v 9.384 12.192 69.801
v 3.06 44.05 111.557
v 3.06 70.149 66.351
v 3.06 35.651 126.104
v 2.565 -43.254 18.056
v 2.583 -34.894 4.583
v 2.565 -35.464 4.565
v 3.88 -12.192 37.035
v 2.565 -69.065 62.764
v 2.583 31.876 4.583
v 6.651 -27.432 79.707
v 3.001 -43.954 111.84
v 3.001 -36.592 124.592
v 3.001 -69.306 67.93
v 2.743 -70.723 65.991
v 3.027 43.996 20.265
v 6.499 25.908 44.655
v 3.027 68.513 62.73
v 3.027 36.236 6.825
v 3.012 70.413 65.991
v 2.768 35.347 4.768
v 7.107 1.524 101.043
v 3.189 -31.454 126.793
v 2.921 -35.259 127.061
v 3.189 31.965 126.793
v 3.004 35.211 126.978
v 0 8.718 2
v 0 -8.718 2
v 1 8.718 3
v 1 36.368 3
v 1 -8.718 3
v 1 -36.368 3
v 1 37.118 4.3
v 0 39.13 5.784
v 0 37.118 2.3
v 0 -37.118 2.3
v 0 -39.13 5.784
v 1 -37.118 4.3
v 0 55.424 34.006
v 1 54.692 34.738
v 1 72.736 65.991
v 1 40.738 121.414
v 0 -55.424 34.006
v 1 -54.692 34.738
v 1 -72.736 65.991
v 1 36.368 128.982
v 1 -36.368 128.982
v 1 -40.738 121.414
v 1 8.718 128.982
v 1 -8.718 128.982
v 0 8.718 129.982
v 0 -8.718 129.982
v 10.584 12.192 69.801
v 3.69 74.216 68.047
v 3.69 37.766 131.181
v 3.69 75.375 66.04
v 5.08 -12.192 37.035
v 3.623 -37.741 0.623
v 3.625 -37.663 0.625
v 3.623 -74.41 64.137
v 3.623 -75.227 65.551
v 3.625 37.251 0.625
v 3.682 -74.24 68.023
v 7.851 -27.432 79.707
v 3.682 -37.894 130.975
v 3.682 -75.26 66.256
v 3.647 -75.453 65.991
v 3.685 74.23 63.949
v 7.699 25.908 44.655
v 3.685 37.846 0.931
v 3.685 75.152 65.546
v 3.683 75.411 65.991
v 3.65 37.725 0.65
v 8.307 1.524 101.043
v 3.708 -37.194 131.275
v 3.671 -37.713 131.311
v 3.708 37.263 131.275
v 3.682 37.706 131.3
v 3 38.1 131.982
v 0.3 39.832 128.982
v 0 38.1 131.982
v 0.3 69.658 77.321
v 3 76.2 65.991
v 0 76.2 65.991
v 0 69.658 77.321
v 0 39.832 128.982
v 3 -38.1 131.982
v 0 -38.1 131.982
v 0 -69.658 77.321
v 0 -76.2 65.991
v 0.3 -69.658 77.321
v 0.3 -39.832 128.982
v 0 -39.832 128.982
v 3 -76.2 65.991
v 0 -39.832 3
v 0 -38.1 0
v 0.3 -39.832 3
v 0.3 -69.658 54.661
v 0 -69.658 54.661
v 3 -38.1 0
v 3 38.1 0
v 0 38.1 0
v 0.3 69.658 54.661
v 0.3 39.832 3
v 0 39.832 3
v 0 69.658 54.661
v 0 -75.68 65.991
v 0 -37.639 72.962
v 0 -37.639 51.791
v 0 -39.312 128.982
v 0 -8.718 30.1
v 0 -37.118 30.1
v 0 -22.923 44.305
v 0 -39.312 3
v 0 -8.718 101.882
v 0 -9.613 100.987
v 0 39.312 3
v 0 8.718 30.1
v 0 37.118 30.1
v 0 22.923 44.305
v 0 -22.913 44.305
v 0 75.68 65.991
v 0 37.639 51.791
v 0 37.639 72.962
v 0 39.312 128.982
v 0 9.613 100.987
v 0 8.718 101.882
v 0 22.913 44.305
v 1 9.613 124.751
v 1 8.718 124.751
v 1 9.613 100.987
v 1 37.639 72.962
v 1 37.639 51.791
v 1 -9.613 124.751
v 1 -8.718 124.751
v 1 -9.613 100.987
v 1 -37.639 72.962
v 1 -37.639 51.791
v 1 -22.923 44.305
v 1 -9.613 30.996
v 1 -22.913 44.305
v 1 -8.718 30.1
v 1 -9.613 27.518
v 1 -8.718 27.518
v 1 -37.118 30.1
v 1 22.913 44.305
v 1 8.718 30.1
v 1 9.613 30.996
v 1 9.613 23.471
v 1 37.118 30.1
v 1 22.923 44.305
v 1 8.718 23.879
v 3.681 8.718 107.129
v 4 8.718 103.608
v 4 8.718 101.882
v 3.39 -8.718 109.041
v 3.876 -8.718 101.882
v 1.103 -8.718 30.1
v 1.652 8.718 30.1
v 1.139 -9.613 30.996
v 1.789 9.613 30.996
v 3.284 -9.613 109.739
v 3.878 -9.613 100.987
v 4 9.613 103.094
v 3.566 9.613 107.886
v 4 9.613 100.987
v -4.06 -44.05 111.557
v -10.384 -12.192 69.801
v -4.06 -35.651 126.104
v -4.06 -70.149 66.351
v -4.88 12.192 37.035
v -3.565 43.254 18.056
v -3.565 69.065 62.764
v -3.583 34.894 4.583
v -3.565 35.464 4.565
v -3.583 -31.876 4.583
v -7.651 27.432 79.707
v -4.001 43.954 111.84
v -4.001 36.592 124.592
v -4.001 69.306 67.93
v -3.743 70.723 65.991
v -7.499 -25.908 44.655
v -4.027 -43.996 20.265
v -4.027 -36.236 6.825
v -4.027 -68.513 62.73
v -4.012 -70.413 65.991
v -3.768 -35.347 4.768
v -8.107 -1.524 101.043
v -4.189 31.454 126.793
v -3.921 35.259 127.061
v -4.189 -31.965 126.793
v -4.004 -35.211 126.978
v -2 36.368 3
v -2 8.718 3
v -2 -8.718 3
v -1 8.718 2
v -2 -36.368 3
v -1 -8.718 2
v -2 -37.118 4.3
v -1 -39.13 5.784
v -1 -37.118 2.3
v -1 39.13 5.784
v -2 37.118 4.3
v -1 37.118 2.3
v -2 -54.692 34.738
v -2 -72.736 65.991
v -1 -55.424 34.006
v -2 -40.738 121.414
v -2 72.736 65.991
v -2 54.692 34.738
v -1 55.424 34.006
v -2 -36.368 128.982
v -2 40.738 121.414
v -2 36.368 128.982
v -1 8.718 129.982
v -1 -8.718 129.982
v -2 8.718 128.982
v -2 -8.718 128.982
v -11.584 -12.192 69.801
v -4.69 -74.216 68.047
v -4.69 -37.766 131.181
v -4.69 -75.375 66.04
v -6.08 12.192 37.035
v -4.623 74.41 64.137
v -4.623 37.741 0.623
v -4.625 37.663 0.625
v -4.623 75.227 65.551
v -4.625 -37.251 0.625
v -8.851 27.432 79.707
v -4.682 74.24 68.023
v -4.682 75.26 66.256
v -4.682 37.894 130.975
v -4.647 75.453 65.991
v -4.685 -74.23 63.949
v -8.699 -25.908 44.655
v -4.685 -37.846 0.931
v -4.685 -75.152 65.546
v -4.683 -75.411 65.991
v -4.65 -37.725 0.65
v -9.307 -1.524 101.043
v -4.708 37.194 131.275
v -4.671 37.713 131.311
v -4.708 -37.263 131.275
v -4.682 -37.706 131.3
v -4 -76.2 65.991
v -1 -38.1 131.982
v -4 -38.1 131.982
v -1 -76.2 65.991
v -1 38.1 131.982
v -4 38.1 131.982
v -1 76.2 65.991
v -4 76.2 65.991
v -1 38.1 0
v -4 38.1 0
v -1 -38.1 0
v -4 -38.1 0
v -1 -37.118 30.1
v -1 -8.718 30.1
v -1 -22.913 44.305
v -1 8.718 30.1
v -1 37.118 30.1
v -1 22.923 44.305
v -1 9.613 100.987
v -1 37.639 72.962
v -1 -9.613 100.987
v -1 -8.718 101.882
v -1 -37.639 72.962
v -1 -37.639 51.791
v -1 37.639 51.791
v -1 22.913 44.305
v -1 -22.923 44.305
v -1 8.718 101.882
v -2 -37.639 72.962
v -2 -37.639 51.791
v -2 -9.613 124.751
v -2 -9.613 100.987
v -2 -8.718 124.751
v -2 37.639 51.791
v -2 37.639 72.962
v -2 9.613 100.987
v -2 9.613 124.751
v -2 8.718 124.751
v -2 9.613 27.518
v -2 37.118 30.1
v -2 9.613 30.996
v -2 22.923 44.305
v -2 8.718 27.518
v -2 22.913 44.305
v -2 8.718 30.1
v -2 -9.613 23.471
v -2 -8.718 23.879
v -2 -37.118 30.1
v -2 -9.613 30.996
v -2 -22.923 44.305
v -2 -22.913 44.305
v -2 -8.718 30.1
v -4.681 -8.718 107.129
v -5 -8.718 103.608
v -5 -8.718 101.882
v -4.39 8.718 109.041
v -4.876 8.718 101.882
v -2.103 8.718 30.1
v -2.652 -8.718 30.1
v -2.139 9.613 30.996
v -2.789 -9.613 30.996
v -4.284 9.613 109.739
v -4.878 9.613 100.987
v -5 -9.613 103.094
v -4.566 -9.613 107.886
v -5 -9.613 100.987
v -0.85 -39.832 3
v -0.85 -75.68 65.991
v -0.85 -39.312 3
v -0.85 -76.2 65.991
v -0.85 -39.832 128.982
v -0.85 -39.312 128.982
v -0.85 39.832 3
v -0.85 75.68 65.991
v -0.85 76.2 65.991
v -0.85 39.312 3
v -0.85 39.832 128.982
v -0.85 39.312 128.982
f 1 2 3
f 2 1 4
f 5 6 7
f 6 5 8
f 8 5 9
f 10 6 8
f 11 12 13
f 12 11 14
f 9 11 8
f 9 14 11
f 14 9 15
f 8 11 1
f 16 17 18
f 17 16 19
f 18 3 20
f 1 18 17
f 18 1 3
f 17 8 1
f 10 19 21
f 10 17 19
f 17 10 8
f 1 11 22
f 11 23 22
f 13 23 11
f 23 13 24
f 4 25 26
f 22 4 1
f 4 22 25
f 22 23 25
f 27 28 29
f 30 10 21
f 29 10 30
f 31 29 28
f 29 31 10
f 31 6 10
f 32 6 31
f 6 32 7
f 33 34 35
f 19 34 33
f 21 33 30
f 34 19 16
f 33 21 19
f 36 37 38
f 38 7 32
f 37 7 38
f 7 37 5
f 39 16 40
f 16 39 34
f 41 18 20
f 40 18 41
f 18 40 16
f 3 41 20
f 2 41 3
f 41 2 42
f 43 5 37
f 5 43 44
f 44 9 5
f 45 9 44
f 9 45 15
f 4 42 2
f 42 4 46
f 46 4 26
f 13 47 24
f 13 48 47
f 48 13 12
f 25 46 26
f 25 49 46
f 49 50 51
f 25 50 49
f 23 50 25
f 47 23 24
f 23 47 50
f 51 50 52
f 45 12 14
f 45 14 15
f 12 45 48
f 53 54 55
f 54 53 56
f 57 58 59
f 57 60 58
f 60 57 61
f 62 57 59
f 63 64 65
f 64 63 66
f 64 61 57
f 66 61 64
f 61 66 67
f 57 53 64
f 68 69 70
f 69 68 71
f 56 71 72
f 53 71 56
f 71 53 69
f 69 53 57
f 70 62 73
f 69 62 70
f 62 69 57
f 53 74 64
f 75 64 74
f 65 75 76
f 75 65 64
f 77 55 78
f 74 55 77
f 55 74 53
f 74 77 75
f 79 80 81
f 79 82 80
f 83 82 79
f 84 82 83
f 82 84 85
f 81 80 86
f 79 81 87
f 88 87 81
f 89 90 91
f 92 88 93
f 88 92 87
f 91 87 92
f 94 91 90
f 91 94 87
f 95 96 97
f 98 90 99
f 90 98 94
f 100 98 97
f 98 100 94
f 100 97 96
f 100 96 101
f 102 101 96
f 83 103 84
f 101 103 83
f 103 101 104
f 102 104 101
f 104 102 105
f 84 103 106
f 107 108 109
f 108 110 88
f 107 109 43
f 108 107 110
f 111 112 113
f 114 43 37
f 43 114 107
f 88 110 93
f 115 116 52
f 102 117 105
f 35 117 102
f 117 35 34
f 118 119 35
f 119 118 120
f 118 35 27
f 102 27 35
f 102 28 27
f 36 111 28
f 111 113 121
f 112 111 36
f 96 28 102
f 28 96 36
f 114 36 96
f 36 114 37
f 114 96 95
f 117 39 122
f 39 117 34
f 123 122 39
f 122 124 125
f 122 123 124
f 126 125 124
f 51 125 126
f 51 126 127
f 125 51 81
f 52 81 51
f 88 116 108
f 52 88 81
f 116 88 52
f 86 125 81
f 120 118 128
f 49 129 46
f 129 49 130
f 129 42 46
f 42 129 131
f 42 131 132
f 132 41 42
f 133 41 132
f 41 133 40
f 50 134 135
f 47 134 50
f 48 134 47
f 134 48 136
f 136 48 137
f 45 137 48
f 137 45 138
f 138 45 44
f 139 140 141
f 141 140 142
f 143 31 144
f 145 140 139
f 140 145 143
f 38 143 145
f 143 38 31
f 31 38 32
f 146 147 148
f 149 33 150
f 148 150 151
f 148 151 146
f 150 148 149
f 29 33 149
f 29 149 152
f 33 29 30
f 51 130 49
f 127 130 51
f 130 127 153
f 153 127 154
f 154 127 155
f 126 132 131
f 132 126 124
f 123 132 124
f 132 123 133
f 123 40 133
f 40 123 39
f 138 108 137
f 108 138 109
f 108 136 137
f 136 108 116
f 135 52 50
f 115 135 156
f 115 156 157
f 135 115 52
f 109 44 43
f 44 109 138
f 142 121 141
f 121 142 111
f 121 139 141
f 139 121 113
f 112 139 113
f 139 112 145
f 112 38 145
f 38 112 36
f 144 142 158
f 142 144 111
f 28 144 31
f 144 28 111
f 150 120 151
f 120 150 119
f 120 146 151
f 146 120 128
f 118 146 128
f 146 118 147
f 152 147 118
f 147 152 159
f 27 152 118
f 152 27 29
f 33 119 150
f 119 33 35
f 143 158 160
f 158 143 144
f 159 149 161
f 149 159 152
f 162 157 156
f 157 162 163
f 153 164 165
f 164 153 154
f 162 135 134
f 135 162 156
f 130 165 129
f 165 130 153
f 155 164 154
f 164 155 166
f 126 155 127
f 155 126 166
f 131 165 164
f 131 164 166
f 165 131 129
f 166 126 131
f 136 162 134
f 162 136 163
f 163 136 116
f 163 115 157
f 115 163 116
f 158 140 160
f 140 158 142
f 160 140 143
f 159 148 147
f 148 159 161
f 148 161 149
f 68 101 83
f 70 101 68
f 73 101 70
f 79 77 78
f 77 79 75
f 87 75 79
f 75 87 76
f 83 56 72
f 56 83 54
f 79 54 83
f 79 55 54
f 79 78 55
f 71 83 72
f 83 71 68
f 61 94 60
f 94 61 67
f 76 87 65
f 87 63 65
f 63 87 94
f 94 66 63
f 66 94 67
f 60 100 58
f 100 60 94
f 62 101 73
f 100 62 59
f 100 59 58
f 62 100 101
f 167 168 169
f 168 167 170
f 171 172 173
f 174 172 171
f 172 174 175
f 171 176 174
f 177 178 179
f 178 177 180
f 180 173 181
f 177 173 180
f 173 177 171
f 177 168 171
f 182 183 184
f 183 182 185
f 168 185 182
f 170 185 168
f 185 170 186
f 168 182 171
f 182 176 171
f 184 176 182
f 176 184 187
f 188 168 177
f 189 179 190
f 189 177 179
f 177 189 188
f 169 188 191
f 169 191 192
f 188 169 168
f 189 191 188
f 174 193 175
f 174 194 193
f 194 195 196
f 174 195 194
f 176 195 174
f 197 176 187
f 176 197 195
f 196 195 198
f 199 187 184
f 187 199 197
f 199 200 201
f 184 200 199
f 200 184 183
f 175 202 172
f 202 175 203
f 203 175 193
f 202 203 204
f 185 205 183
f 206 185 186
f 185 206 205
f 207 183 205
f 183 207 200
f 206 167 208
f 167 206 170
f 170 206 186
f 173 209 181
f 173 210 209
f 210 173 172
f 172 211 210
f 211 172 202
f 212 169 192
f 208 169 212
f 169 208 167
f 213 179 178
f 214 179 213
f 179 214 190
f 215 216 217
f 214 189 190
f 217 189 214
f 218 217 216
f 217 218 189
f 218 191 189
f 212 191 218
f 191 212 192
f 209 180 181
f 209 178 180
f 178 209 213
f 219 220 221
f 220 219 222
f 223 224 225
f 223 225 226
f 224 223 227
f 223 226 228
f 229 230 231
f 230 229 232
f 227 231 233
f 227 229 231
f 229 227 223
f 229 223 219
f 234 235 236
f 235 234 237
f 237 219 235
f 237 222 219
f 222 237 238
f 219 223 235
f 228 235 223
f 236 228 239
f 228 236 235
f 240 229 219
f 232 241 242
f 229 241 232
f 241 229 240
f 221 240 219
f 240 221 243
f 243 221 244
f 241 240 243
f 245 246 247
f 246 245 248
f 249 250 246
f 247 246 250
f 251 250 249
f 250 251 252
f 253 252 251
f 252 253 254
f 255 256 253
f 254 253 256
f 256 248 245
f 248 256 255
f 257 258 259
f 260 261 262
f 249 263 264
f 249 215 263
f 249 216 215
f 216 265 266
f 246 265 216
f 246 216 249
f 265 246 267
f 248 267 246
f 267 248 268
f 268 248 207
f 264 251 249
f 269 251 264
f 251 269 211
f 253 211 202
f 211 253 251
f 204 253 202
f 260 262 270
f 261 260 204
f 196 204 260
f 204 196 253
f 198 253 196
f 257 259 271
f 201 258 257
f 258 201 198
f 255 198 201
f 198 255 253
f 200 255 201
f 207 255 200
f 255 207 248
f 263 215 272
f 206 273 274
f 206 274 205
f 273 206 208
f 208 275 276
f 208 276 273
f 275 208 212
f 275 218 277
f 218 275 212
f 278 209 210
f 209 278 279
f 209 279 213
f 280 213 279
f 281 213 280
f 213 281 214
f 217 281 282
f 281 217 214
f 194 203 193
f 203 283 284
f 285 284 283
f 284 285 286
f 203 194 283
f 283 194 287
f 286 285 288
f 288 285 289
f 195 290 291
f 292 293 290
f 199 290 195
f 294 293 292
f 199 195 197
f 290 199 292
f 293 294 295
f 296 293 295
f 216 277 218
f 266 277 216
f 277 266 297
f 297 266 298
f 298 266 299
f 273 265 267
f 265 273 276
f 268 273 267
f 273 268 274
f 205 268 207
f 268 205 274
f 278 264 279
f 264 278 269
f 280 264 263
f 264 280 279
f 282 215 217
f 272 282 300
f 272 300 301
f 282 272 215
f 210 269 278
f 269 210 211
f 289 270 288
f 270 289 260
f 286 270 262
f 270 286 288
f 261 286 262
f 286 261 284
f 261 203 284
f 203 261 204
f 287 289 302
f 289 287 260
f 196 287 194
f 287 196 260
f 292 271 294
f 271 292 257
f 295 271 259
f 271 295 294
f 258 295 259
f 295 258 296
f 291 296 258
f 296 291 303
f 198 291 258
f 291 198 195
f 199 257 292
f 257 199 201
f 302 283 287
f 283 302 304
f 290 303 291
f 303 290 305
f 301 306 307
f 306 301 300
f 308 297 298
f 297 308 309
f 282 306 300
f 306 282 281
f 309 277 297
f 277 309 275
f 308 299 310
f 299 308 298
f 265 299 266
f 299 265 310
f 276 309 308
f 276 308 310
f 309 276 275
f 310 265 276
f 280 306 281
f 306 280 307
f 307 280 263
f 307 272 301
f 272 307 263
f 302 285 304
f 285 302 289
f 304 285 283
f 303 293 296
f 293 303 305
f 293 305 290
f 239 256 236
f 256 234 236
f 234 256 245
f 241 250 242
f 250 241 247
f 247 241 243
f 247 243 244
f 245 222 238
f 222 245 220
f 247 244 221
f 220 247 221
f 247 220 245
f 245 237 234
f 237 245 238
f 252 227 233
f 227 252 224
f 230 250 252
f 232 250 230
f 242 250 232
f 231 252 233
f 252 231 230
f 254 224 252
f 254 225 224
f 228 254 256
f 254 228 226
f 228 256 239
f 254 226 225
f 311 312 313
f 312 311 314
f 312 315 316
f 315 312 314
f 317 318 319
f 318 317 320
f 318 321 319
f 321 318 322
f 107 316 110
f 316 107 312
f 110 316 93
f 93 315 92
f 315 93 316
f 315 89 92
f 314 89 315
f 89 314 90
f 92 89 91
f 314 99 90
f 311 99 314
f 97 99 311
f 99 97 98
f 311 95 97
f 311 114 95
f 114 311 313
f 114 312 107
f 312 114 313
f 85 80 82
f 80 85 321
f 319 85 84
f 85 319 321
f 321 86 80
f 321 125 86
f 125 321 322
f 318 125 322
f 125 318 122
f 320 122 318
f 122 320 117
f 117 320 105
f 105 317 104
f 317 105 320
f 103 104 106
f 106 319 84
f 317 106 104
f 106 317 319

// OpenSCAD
// Hexagon wall tile v50 — parametric rebuild of v30
// Front: identical low-poly facets to v30 (same facet angles at every size).
// Edge profile: identical on every size (edge depth, rim width) so tiles butt flush.
// Back: six corner pads for 1" (25 mm) double-sided mounting tape.
// v32: tape pads are flat plates hung from the rim with an air gap to the front skin.
// v33: thinner skin + thinner pads so the air gap is 1.4 mm even right at the edges
//      (v32 had only 0.8 mm there and showed marks along the slanted edges).
// v34: snap-off stabilizer fins behind the bottom edge so the tall, thin tile can't tip over
//      while printing. Break them off afterwards (bend sideways) and the back stays flat.
// v35: 0.6 mm 45° chamfer on the front edge (crisp, consistent shadow line between tiles; hides
//      first-layer squish and brim trim marks) + relief_scale to deepen the facets if wanted.
// v37: much smaller breakaway tabs (0.8 x 0.6 mm, every 8 mm) so the fins snap off easily.
// v38: full-height snap-off BRACE FRAME behind the tile: a thin hex ring + X/vertical bars,
//      1 mm behind the back, tied to the tile rim by tiny tabs all the way round (incl. the top).
//      Tile + brace act as a stiff box while printing; the fins now sit on the brace.
//      Peel the brace off after printing — the tabs only touch the back rim.
// v39: PAIR mode (default): two identical tiles printed back-to-back, 0.4 mm apart, so each
//      cradles the other full-height. Only 12 tiny tabs (corners + mid-sides) join the back
//      rims — twist/peel the tiles apart. No brace, no fins, almost no waste. The pair is
//      turned 90° on the bed so the 'back' seam lands on a side edge, not on either face.
// v40: pair tabs spaced evenly every ~pair_tab_pitch mm round the rim on EVERY size. In v39 the
//      tab spacing grew with the tile (3": ~23 mm max gap, 6": ~46 mm, 10": ~79 mm), so the 3" pair
//      printed perfectly but the 6" rims flexed apart between tabs and broke up above mid-height.
//      Now every size has the same tab spacing as a stiff 3" pair (or tighter).
// v42: tabs replaced by one continuous hairline SEAM round the outer edge of the pair gap.
//      Discrete tabs changed the toolpath on every layer that had a tab, leaving a faint line
//      across the tile every ~10 mm of height. With a continuous seam every layer has the same
//      shape, so there is nothing to print differently. Separate the tiles by running a utility
//      knife along the seam line on the edges, then twist apart.
// v43: stiffer tape pads — each pad now grows from the back plane toward the front until it is
//      pad_gap (1.4 mm) from the skin, instead of being a 1 mm plate (the skin stays untouched, so
//      no ghost lines). Larger tiles (>= mid_pad_min_in)
//      get four extra pads at the slanted mid-edges: 10 tape spots on the 10".
// v44: UNIFORM pads. Every pad is the same PAD x PAD tape square, pushed snug into its corner
//      (touching both rims), with only a small 45° gusset beneath it down to the rim so it prints
//      without support. Because a hex corner is the same angle at every size, the 6" and 10" pads
//      are identical in shape and size; the 3" uses the same layout with smaller squares.
//      The 10" adds the same square at the middle of each slanted edge.
// v46: pads are a 1 mm plate with a stiffening LIP round the free edges (like a shallow tray),
//      instead of solid-filled — nearly the stiffness of v44's deep pads at close to v42 print time.
// v47: pair gap 0.4 -> 1.0 mm. At 0.4 mm the squashed back walls of the two tiles touched and
//      fused, so v42-v46 pairs would not come apart. At 1.0 mm only the hairline edge seam joins
//      them: cut it with a utility knife (there is now room for the blade) and they separate.
// v48: seam only on the four SLANTED edges. The top and bottom flat edges are left open (a 1 mm
//      slot), so a putty knife / flat screwdriver can go in and pry the pair open, unzipping the
//      seam. Every layer still crosses the seam at both ends, so the layer shape stays constant.
// v49: "KISS" seam — the seam is printed on ONE tile only and stops seam_kiss short of the other
//      tile's back. The two tiles are never one solid: they only touch where the plastic squashes
//      out, which tacks them lightly (enough to steady them while printing, weak enough to snap by
//      hand). Set seam_kiss = 0 to go back to the fused v48 seam.
// v50: (1) every tape pad gets a 45° pointed top, so pads taper out over many layers instead of
//      ending on one layer. Abrupt pad ends changed the layer time suddenly and left a line across
//      the face (seen at ~14% and ~36% height on the 10").
//      (2) the stiffening lips stay lip_gap (2.5 mm) clear of the skin, not 1.4: near the edges the
//      lips were hugging the skin and ghosting through as ridges parallel to the edge.
// Prints upright on a flat edge with NO supports (every downward edge is 45° or steeper).
//
// Export one size at a time, e.g.:
//   openscad -D size_in=6 -o hex_pair_v50_6in.stl hex_wall_tile_v50.scad

/* [Size] */
size_in       = 6;      // point-to-point width in inches (3, 6, 10 ...)

/* [Edge profile — keep identical across sizes] */
// Space behind the skin at the edge = edge_depth - skin; it must be >= pad_plate + pad_gap + pad_recess.
edge_depth    = 3.6;    // depth of the outer edge, back plane to front face (mm)
rim           = 2.0;    // perimeter wall thickness at the back plane (mm)
front_chamfer = 0.6;    // 45° chamfer on the front edge (mm); 0 = sharp edge

/* [Look] */
relief_scale  = 1.0;    // 1.0 = v30 facets; 1.5 = 50% deeper facets (same edge profile on all sizes)

/* [Front skin] */
skin          = 1.2;    // front skin thickness (mm) — 3 lines at 0.4 mm, same on all sizes

/* [Tape pads] */
tape_width    = 25.4;   // tape width (mm)
pad_margin    = 3;      // extra pad width beyond the tape (mm)
pad_max_frac  = 0.45;   // pad never larger than this fraction of the tile radius (keeps 3" usable)
pad_plate     = 1.0;    // minimum pad thickness (mm) — at the very edge, where there is least room
pad_depth     = 4;      // stiffening lip depth (mm); always stops pad_gap from the skin
lip_gap       = 2.5;    // lips stop this far from the skin (plates keep pad_gap)
pad_lip       = 0.9;    // lip thickness (mm) — two lines
mid_pad_min_in = 8;     // tiles this size or larger also get pads at the four slanted mid-edges
pad_gap       = 1.4;    // minimum air gap between pads and the front skin (mm) — keeps the front clean
pad_recess    = 0;      // pads set back from the rim (mm); >0 lets the rim touch the wall,
                        // but near the edges the plate is then trimmed thinner to keep pad_gap

/* [Print stabilizers (snap off after printing)] */
stabilizers   = false;  // v34-v38 option; not needed in pair mode
fin_count     = 2;      // fins behind the bottom edge, placed symmetrically
fin_thick     = 1.6;    // fin thickness (mm)
fin_height_frac = 0.35; // fin height as a fraction of the tile height
fin_depth_frac  = 0.4;  // fin depth behind the brace as a fraction of fin height
fin_depth_min   = 15;   // (mm)
fin_gap       = 0.5;    // air gap between fin and tile back (mm)
tab_height    = 0.6;    // breakaway tab height (mm, vertical when printing) — 3 layers at 0.2
tab_width     = 0.8;    // breakaway tab width (mm), centred on the fin — 2 lines
tab_pitch     = 8;      // spacing between tabs (mm)

/* [Full-height brace frame (snap off after printing)] */
brace         = false;  // v38 option; not needed in pair mode
brace_gap     = 1.0;    // air gap between tile back and brace (mm)
brace_thick   = 1.6;    // brace thickness (mm)
brace_rim_w   = 4;      // width of the brace's hex ring (mm)
brace_bar_w   = 3;      // width of the X and vertical bars (mm)
brace_tab_pitch = 10;   // spacing of brace tabs along each rim side (mm)
brace_tab     = 0.8;    // brace tab size (mm) — tiny, so the brace peels off

/* [Back-to-back pair (default)] */
pair          = true;
pair_gap      = 1.0;    // gap between the two back planes (mm) — v47: 1.0 so the backs cannot fuse; the edge seam alone joins them
pair_tab      = 0.6;    // tab size (mm) — tiny, so the pair twists apart
pair_tab_pitch = 12;    // (v40 tabs, unused when pair_seam_w > 0)
pair_seam_w   = 0.45;   // width of the continuous edge seam bridging the gap (mm) — about one line
seam_kiss     = 0.15;   // gap between the seam tip and the other tile (mm); 0 = fused seam
seam_open     = 3;      // leave the seam off this far from the top and bottom flat edges (mm) -> pry slots

/* [Output] */
orient_for_print = true; // stand upright on a flat edge, back facing +Y

/* [Hidden] */
R   = size_in * 25.4 / 2;         // corner radius
AP  = R * cos(30);                // apothem
PAD = min(tape_width + pad_margin, R * pad_max_frac);

// Normalised front geometry from v30 (x, y in units of R; z = relief above edge, units of R)
FP = [[1,0,0],[0.5,0.866025,0],[-0.5,0.866025,0],[-1,0,0],[-0.5,-0.866025,0],[0.5,-0.866025,0],
      [0.16,0.05,0.091654],[-0.16,-0.38,0.019428],[-0.36,0.18,0.05579],[0.34,-0.28,0.053795],[0.02,0.46,0.061766]];
FACES = [[0,6,1],[4,3,7],[5,4,7],[8,3,2],[7,3,8],[7,8,6],[5,9,0],[9,6,0],[9,7,6],[5,7,9],
         [6,8,10],[8,2,10],[6,10,1],[10,2,1],
         [1,12,11,0],[2,13,12,1],[3,14,13,2],[4,15,14,3],[5,16,15,4],[0,11,16,5],
         [11,12,13,14,15,16]];
RELIEF_MAX = 0.091654 * R * relief_scale;
D = edge_depth + RELIEF_MAX + 1;  // max depth used for chamfers

// Solid bounded by the faceted front (shifted by dz) and a flat back at z = zb
module body(dz = 0, zb = 0) {
    pts = concat(
        [for (p = FP) [p[0]*R, p[1]*R, edge_depth + p[2]*R*relief_scale + dz]],
        [for (i = [0:5]) [FP[i][0]*R, FP[i][1]*R, zb]]);
    polyhedron(points = pts, faces = FACES, convexity = 4);
}

module hex2d(apothem) { circle(r = apothem / cos(30), $fn = 6); }

// Back cavity: behind the skin, inside the rim; rim inner faces slope 45° so nothing needs support
module cavity(extra = 0) {
    H  = D + 2;
    a0 = AP - rim - extra + 1;             // apothem at z = -1
    intersection() {
        body(dz = -skin - extra, zb = -1);
        translate([0, 0, -1]) linear_extrude(height = H, scale = (a0 - H) / a0) hex2d(a0);
    }
}

// ---- Uniform tape pads ----------------------------------------------------------------
PA = AP - rim + 0.3;                    // inner apothem used for pads (0.3 mm overlap fuses them to the rim)
PH = PAD / 2;
function nrm(a) = [cos(a), sin(a)];
function lim(a) = PA - PH * (abs(cos(a)) + abs(sin(a)));     // max n.c for an axis-aligned PAD square
// centre of a PAD square snug in the corner at angle t (touches the two rims meeting there)
function corner_c(t) = let(n1 = nrm(t - 30), n2 = nrm(t + 30), b1 = lim(t - 30), b2 = lim(t + 30), d = sin(60))
    [(b1*n2[1] - b2*n1[1]) / d, (n1[0]*b2 - n2[0]*b1) / d];
// centre of a PAD square snug against the middle of the edge whose normal is at angle a
function edge_c(a) = lim(a) * nrm(a);
// downward 45° (or vertical) gusset direction toward the nearest rim below — printed upright, model -y is down
function gdir(t) = (cos(t) > 0.1) ? [1, -1] : (cos(t) < -0.1) ? [-1, -1] : [0, -1];

module pad_sq(c, dir) {
    intersection() {
        hex2d(PA);
        hull() {
            translate(c) square(PAD, center = true);
            translate(c + [0, PAD/2 + PAD/2]) square(0.01, center = true);   // 45° pointed top
            translate(c + dir * R) square(PAD, center = true);
        }
    }
}
module pad_fp(k)  { t = 60*k;      pad_sq(corner_c(t), (k == 4 || k == 5) ? [0, -1] : gdir(t)); }
module mid_fp(k)  { a = 30 + 60*k; pad_sq(edge_c(a),   (k == 3 || k == 5) ? [0, -1] : gdir(a)); }

module pad_fps() {
    for (k = [0:5]) pad_fp(k);
    if (size_in >= mid_pad_min_in) for (k = [0, 2, 3, 5]) mid_fp(k);
}
module pads() {
    translate([0, 0, pad_recess]) {
        intersection() {                                   // flat tape plate, pad_gap from the skin
            body(dz = -skin - pad_gap, zb = -1);
            linear_extrude(pad_plate) pad_fps();
        }
        intersection() {                                   // stiffening lip, lip_gap from the skin
            body(dz = -skin - lip_gap, zb = -1);
            linear_extrude(max(pad_plate, pad_depth))      // vertical side edges only: they rise smoothly
                difference() {                             //  with no ledges when printed upright
                    pad_fps();
                    minkowski() { offset(delta = -pad_lip) pad_fps(); translate([-0.005, -2*R]) square([0.01, 4*R]); }
                }
        }
    }
}

module chamfer_clip() {
    HB = D + 5;
    union() {
        translate([0, 0, -2]) linear_extrude(edge_depth - front_chamfer + 2) hex2d(AP + 1);
        translate([0, 0, edge_depth - front_chamfer]) linear_extrude(height = HB, scale = (AP - HB) / AP) hex2d(AP);
    }
}

module tile() {
    intersection() {
        union() {
            difference() { body(); cavity(); }
            pads();
        }
        if (front_chamfer > 0) chamfer_clip(); else translate([-2*R, -2*R, -5]) cube([4*R, 4*R, 4*R]);
    }
}

// Triangular fins standing on the bed behind the back (model z < 0), joined to the tile by small tabs
FIN_H = fin_height_frac * 2 * AP;
FIN_L = max(fin_depth_min, fin_depth_frac * FIN_H);
function fin_x(i) = (fin_count == 1) ? 0 : (-1 + 2 * i / (fin_count - 1)) * 0.35 * R;
BZ = brace ? brace_gap + brace_thick : 0;          // fins start behind the brace when it is used
module stabilizer_fins() {
    for (i = [0 : fin_count - 1]) {
        x = fin_x(i);
        fg = brace ? BZ - 0.3 : fin_gap;                // with a brace: fused into it (no tabs needed)
        hull() {                                            // fin: vertical triangle
            translate([x - fin_thick/2, -AP, -fg - FIN_L]) cube([fin_thick, 0.01, FIN_L]);
            translate([x - fin_thick/2, -AP, -fg - 0.01]) cube([fin_thick, FIN_H, 0.01]);
        }
        if (!brace)
            for (y = [0 : tab_pitch : FIN_H - tab_height])  // breakaway tabs into the back plane
                translate([x - tab_width/2, -AP + y, -fin_gap - 0.05]) cube([tab_width, tab_height, fin_gap + 0.35]);
    }
}

// Brace frame (2D, in the tile plane). Printed upright, so every downward-facing edge is >= 45°:
// the top bar is carried by 45° roofs in the two top windows; bars run vertical or at ±60°.
module brace_2d() {
    W  = brace_rim_w;
    Yt = AP - W;                                        // underside of the top ring bar
    difference() {
        hex2d(AP);
        intersection() {                                // the open window, with a 45° roof under the top bar
            hex2d(AP - W);
            // only the two top windows touch the top bar: give them a 45° valley roof
            polygon([[-2*R, -2*R], [2*R, -2*R], [2*R, 2*R], [R/2, 2*R], [R/2, Yt],
                     [0, Yt - R/2], [-R/2, Yt], [-R/2, 2*R], [-2*R, 2*R]]);
        }
    }
    intersection() {
        hex2d(AP);
        union() {
            square([brace_bar_w, 2*AP], center = true);                 // vertical bar
            rotate(60)  square([4*R, brace_bar_w], center = true);      // ±60° diagonals (corner to corner)
            rotate(-60) square([4*R, brace_bar_w], center = true);
        }
    }
}

module brace_frame() {
    translate([0, 0, -BZ]) linear_extrude(brace_thick) brace_2d();
    // tiny tabs across the gap, on the tile's back rim (1 mm in from the outline), all six sides
    for (k = [0:5]) {
        a0 = 60*k; a1 = 60*(k+1);
        p0 = [ (R - 1/sin(60)) * cos(a0), (R - 1/sin(60)) * sin(a0) ];
        p1 = [ (R - 1/sin(60)) * cos(a1), (R - 1/sin(60)) * sin(a1) ];
        L  = norm(p1 - p0);
        n  = floor((L - 6) / brace_tab_pitch);
        for (j = [0 : n]) {
            t = (3 + j * (L - 6) / max(n, 1)) / L;
            p = p0 + t * (p1 - p0);
            translate([p[0], p[1], -brace_gap - 0.3]) rotate(a0 + 120)
                translate([-brace_tab/2, -brace_tab/2, 0]) cube([brace_tab, brace_tab, brace_gap + 0.6]);
        }
    }
}

// Tabs across the pair gap, evenly spaced along each rim side (1 mm in from the outline)
module pair_tabs() {
    rr = R - 1/sin(60);
    n  = max(2, ceil(rr / pair_tab_pitch));          // side length = rr
    for (k = [0:5]) for (i = [0:n-1]) {
        f  = (i + 0.5) / n;
        a0 = 60*k; a1 = 60*(k+1);
        p = [rr*cos(a0), rr*sin(a0)] + f * ([rr*cos(a1), rr*sin(a1)] - [rr*cos(a0), rr*sin(a0)]);
        translate([p[0], p[1], -pair_gap - 0.3]) rotate(a0 + 120)
            translate([-pair_tab/2, -pair_tab/2, 0]) cube([pair_tab, pair_tab, pair_gap + 0.6]);
    }
}
// Continuous hairline seam round the outline, bridging the gap between the two back planes
module pair_seam() {
    z0 = (seam_kiss > 0) ? -pair_gap + seam_kiss : -pair_gap - 0.3;      // kiss: stops short of the partner
    translate([0, 0, z0]) linear_extrude(0.3 - z0)
        intersection() {
            difference() { hex2d(AP); hex2d(AP - pair_seam_w); }
            square([4*R, 2*(AP - seam_open)], center = true);   // slanted edges only
        }
}
module partner() { translate([0, 0, -pair_gap]) rotate([0, 180, 0]) tile(); }   // same tile turned round, not mirrored

module assembly() {
    tile();
    if (pair) { partner(); if (pair_seam_w > 0) pair_seam(); else pair_tabs(); }
    else { if (brace) brace_frame(); if (stabilizers) stabilizer_fins(); }
}

if (orient_for_print)
    rotate([0, 0, pair ? 90 : 0]) translate([0, 0, AP]) rotate([90, 0, 0]) assembly();
else
    assembly();
